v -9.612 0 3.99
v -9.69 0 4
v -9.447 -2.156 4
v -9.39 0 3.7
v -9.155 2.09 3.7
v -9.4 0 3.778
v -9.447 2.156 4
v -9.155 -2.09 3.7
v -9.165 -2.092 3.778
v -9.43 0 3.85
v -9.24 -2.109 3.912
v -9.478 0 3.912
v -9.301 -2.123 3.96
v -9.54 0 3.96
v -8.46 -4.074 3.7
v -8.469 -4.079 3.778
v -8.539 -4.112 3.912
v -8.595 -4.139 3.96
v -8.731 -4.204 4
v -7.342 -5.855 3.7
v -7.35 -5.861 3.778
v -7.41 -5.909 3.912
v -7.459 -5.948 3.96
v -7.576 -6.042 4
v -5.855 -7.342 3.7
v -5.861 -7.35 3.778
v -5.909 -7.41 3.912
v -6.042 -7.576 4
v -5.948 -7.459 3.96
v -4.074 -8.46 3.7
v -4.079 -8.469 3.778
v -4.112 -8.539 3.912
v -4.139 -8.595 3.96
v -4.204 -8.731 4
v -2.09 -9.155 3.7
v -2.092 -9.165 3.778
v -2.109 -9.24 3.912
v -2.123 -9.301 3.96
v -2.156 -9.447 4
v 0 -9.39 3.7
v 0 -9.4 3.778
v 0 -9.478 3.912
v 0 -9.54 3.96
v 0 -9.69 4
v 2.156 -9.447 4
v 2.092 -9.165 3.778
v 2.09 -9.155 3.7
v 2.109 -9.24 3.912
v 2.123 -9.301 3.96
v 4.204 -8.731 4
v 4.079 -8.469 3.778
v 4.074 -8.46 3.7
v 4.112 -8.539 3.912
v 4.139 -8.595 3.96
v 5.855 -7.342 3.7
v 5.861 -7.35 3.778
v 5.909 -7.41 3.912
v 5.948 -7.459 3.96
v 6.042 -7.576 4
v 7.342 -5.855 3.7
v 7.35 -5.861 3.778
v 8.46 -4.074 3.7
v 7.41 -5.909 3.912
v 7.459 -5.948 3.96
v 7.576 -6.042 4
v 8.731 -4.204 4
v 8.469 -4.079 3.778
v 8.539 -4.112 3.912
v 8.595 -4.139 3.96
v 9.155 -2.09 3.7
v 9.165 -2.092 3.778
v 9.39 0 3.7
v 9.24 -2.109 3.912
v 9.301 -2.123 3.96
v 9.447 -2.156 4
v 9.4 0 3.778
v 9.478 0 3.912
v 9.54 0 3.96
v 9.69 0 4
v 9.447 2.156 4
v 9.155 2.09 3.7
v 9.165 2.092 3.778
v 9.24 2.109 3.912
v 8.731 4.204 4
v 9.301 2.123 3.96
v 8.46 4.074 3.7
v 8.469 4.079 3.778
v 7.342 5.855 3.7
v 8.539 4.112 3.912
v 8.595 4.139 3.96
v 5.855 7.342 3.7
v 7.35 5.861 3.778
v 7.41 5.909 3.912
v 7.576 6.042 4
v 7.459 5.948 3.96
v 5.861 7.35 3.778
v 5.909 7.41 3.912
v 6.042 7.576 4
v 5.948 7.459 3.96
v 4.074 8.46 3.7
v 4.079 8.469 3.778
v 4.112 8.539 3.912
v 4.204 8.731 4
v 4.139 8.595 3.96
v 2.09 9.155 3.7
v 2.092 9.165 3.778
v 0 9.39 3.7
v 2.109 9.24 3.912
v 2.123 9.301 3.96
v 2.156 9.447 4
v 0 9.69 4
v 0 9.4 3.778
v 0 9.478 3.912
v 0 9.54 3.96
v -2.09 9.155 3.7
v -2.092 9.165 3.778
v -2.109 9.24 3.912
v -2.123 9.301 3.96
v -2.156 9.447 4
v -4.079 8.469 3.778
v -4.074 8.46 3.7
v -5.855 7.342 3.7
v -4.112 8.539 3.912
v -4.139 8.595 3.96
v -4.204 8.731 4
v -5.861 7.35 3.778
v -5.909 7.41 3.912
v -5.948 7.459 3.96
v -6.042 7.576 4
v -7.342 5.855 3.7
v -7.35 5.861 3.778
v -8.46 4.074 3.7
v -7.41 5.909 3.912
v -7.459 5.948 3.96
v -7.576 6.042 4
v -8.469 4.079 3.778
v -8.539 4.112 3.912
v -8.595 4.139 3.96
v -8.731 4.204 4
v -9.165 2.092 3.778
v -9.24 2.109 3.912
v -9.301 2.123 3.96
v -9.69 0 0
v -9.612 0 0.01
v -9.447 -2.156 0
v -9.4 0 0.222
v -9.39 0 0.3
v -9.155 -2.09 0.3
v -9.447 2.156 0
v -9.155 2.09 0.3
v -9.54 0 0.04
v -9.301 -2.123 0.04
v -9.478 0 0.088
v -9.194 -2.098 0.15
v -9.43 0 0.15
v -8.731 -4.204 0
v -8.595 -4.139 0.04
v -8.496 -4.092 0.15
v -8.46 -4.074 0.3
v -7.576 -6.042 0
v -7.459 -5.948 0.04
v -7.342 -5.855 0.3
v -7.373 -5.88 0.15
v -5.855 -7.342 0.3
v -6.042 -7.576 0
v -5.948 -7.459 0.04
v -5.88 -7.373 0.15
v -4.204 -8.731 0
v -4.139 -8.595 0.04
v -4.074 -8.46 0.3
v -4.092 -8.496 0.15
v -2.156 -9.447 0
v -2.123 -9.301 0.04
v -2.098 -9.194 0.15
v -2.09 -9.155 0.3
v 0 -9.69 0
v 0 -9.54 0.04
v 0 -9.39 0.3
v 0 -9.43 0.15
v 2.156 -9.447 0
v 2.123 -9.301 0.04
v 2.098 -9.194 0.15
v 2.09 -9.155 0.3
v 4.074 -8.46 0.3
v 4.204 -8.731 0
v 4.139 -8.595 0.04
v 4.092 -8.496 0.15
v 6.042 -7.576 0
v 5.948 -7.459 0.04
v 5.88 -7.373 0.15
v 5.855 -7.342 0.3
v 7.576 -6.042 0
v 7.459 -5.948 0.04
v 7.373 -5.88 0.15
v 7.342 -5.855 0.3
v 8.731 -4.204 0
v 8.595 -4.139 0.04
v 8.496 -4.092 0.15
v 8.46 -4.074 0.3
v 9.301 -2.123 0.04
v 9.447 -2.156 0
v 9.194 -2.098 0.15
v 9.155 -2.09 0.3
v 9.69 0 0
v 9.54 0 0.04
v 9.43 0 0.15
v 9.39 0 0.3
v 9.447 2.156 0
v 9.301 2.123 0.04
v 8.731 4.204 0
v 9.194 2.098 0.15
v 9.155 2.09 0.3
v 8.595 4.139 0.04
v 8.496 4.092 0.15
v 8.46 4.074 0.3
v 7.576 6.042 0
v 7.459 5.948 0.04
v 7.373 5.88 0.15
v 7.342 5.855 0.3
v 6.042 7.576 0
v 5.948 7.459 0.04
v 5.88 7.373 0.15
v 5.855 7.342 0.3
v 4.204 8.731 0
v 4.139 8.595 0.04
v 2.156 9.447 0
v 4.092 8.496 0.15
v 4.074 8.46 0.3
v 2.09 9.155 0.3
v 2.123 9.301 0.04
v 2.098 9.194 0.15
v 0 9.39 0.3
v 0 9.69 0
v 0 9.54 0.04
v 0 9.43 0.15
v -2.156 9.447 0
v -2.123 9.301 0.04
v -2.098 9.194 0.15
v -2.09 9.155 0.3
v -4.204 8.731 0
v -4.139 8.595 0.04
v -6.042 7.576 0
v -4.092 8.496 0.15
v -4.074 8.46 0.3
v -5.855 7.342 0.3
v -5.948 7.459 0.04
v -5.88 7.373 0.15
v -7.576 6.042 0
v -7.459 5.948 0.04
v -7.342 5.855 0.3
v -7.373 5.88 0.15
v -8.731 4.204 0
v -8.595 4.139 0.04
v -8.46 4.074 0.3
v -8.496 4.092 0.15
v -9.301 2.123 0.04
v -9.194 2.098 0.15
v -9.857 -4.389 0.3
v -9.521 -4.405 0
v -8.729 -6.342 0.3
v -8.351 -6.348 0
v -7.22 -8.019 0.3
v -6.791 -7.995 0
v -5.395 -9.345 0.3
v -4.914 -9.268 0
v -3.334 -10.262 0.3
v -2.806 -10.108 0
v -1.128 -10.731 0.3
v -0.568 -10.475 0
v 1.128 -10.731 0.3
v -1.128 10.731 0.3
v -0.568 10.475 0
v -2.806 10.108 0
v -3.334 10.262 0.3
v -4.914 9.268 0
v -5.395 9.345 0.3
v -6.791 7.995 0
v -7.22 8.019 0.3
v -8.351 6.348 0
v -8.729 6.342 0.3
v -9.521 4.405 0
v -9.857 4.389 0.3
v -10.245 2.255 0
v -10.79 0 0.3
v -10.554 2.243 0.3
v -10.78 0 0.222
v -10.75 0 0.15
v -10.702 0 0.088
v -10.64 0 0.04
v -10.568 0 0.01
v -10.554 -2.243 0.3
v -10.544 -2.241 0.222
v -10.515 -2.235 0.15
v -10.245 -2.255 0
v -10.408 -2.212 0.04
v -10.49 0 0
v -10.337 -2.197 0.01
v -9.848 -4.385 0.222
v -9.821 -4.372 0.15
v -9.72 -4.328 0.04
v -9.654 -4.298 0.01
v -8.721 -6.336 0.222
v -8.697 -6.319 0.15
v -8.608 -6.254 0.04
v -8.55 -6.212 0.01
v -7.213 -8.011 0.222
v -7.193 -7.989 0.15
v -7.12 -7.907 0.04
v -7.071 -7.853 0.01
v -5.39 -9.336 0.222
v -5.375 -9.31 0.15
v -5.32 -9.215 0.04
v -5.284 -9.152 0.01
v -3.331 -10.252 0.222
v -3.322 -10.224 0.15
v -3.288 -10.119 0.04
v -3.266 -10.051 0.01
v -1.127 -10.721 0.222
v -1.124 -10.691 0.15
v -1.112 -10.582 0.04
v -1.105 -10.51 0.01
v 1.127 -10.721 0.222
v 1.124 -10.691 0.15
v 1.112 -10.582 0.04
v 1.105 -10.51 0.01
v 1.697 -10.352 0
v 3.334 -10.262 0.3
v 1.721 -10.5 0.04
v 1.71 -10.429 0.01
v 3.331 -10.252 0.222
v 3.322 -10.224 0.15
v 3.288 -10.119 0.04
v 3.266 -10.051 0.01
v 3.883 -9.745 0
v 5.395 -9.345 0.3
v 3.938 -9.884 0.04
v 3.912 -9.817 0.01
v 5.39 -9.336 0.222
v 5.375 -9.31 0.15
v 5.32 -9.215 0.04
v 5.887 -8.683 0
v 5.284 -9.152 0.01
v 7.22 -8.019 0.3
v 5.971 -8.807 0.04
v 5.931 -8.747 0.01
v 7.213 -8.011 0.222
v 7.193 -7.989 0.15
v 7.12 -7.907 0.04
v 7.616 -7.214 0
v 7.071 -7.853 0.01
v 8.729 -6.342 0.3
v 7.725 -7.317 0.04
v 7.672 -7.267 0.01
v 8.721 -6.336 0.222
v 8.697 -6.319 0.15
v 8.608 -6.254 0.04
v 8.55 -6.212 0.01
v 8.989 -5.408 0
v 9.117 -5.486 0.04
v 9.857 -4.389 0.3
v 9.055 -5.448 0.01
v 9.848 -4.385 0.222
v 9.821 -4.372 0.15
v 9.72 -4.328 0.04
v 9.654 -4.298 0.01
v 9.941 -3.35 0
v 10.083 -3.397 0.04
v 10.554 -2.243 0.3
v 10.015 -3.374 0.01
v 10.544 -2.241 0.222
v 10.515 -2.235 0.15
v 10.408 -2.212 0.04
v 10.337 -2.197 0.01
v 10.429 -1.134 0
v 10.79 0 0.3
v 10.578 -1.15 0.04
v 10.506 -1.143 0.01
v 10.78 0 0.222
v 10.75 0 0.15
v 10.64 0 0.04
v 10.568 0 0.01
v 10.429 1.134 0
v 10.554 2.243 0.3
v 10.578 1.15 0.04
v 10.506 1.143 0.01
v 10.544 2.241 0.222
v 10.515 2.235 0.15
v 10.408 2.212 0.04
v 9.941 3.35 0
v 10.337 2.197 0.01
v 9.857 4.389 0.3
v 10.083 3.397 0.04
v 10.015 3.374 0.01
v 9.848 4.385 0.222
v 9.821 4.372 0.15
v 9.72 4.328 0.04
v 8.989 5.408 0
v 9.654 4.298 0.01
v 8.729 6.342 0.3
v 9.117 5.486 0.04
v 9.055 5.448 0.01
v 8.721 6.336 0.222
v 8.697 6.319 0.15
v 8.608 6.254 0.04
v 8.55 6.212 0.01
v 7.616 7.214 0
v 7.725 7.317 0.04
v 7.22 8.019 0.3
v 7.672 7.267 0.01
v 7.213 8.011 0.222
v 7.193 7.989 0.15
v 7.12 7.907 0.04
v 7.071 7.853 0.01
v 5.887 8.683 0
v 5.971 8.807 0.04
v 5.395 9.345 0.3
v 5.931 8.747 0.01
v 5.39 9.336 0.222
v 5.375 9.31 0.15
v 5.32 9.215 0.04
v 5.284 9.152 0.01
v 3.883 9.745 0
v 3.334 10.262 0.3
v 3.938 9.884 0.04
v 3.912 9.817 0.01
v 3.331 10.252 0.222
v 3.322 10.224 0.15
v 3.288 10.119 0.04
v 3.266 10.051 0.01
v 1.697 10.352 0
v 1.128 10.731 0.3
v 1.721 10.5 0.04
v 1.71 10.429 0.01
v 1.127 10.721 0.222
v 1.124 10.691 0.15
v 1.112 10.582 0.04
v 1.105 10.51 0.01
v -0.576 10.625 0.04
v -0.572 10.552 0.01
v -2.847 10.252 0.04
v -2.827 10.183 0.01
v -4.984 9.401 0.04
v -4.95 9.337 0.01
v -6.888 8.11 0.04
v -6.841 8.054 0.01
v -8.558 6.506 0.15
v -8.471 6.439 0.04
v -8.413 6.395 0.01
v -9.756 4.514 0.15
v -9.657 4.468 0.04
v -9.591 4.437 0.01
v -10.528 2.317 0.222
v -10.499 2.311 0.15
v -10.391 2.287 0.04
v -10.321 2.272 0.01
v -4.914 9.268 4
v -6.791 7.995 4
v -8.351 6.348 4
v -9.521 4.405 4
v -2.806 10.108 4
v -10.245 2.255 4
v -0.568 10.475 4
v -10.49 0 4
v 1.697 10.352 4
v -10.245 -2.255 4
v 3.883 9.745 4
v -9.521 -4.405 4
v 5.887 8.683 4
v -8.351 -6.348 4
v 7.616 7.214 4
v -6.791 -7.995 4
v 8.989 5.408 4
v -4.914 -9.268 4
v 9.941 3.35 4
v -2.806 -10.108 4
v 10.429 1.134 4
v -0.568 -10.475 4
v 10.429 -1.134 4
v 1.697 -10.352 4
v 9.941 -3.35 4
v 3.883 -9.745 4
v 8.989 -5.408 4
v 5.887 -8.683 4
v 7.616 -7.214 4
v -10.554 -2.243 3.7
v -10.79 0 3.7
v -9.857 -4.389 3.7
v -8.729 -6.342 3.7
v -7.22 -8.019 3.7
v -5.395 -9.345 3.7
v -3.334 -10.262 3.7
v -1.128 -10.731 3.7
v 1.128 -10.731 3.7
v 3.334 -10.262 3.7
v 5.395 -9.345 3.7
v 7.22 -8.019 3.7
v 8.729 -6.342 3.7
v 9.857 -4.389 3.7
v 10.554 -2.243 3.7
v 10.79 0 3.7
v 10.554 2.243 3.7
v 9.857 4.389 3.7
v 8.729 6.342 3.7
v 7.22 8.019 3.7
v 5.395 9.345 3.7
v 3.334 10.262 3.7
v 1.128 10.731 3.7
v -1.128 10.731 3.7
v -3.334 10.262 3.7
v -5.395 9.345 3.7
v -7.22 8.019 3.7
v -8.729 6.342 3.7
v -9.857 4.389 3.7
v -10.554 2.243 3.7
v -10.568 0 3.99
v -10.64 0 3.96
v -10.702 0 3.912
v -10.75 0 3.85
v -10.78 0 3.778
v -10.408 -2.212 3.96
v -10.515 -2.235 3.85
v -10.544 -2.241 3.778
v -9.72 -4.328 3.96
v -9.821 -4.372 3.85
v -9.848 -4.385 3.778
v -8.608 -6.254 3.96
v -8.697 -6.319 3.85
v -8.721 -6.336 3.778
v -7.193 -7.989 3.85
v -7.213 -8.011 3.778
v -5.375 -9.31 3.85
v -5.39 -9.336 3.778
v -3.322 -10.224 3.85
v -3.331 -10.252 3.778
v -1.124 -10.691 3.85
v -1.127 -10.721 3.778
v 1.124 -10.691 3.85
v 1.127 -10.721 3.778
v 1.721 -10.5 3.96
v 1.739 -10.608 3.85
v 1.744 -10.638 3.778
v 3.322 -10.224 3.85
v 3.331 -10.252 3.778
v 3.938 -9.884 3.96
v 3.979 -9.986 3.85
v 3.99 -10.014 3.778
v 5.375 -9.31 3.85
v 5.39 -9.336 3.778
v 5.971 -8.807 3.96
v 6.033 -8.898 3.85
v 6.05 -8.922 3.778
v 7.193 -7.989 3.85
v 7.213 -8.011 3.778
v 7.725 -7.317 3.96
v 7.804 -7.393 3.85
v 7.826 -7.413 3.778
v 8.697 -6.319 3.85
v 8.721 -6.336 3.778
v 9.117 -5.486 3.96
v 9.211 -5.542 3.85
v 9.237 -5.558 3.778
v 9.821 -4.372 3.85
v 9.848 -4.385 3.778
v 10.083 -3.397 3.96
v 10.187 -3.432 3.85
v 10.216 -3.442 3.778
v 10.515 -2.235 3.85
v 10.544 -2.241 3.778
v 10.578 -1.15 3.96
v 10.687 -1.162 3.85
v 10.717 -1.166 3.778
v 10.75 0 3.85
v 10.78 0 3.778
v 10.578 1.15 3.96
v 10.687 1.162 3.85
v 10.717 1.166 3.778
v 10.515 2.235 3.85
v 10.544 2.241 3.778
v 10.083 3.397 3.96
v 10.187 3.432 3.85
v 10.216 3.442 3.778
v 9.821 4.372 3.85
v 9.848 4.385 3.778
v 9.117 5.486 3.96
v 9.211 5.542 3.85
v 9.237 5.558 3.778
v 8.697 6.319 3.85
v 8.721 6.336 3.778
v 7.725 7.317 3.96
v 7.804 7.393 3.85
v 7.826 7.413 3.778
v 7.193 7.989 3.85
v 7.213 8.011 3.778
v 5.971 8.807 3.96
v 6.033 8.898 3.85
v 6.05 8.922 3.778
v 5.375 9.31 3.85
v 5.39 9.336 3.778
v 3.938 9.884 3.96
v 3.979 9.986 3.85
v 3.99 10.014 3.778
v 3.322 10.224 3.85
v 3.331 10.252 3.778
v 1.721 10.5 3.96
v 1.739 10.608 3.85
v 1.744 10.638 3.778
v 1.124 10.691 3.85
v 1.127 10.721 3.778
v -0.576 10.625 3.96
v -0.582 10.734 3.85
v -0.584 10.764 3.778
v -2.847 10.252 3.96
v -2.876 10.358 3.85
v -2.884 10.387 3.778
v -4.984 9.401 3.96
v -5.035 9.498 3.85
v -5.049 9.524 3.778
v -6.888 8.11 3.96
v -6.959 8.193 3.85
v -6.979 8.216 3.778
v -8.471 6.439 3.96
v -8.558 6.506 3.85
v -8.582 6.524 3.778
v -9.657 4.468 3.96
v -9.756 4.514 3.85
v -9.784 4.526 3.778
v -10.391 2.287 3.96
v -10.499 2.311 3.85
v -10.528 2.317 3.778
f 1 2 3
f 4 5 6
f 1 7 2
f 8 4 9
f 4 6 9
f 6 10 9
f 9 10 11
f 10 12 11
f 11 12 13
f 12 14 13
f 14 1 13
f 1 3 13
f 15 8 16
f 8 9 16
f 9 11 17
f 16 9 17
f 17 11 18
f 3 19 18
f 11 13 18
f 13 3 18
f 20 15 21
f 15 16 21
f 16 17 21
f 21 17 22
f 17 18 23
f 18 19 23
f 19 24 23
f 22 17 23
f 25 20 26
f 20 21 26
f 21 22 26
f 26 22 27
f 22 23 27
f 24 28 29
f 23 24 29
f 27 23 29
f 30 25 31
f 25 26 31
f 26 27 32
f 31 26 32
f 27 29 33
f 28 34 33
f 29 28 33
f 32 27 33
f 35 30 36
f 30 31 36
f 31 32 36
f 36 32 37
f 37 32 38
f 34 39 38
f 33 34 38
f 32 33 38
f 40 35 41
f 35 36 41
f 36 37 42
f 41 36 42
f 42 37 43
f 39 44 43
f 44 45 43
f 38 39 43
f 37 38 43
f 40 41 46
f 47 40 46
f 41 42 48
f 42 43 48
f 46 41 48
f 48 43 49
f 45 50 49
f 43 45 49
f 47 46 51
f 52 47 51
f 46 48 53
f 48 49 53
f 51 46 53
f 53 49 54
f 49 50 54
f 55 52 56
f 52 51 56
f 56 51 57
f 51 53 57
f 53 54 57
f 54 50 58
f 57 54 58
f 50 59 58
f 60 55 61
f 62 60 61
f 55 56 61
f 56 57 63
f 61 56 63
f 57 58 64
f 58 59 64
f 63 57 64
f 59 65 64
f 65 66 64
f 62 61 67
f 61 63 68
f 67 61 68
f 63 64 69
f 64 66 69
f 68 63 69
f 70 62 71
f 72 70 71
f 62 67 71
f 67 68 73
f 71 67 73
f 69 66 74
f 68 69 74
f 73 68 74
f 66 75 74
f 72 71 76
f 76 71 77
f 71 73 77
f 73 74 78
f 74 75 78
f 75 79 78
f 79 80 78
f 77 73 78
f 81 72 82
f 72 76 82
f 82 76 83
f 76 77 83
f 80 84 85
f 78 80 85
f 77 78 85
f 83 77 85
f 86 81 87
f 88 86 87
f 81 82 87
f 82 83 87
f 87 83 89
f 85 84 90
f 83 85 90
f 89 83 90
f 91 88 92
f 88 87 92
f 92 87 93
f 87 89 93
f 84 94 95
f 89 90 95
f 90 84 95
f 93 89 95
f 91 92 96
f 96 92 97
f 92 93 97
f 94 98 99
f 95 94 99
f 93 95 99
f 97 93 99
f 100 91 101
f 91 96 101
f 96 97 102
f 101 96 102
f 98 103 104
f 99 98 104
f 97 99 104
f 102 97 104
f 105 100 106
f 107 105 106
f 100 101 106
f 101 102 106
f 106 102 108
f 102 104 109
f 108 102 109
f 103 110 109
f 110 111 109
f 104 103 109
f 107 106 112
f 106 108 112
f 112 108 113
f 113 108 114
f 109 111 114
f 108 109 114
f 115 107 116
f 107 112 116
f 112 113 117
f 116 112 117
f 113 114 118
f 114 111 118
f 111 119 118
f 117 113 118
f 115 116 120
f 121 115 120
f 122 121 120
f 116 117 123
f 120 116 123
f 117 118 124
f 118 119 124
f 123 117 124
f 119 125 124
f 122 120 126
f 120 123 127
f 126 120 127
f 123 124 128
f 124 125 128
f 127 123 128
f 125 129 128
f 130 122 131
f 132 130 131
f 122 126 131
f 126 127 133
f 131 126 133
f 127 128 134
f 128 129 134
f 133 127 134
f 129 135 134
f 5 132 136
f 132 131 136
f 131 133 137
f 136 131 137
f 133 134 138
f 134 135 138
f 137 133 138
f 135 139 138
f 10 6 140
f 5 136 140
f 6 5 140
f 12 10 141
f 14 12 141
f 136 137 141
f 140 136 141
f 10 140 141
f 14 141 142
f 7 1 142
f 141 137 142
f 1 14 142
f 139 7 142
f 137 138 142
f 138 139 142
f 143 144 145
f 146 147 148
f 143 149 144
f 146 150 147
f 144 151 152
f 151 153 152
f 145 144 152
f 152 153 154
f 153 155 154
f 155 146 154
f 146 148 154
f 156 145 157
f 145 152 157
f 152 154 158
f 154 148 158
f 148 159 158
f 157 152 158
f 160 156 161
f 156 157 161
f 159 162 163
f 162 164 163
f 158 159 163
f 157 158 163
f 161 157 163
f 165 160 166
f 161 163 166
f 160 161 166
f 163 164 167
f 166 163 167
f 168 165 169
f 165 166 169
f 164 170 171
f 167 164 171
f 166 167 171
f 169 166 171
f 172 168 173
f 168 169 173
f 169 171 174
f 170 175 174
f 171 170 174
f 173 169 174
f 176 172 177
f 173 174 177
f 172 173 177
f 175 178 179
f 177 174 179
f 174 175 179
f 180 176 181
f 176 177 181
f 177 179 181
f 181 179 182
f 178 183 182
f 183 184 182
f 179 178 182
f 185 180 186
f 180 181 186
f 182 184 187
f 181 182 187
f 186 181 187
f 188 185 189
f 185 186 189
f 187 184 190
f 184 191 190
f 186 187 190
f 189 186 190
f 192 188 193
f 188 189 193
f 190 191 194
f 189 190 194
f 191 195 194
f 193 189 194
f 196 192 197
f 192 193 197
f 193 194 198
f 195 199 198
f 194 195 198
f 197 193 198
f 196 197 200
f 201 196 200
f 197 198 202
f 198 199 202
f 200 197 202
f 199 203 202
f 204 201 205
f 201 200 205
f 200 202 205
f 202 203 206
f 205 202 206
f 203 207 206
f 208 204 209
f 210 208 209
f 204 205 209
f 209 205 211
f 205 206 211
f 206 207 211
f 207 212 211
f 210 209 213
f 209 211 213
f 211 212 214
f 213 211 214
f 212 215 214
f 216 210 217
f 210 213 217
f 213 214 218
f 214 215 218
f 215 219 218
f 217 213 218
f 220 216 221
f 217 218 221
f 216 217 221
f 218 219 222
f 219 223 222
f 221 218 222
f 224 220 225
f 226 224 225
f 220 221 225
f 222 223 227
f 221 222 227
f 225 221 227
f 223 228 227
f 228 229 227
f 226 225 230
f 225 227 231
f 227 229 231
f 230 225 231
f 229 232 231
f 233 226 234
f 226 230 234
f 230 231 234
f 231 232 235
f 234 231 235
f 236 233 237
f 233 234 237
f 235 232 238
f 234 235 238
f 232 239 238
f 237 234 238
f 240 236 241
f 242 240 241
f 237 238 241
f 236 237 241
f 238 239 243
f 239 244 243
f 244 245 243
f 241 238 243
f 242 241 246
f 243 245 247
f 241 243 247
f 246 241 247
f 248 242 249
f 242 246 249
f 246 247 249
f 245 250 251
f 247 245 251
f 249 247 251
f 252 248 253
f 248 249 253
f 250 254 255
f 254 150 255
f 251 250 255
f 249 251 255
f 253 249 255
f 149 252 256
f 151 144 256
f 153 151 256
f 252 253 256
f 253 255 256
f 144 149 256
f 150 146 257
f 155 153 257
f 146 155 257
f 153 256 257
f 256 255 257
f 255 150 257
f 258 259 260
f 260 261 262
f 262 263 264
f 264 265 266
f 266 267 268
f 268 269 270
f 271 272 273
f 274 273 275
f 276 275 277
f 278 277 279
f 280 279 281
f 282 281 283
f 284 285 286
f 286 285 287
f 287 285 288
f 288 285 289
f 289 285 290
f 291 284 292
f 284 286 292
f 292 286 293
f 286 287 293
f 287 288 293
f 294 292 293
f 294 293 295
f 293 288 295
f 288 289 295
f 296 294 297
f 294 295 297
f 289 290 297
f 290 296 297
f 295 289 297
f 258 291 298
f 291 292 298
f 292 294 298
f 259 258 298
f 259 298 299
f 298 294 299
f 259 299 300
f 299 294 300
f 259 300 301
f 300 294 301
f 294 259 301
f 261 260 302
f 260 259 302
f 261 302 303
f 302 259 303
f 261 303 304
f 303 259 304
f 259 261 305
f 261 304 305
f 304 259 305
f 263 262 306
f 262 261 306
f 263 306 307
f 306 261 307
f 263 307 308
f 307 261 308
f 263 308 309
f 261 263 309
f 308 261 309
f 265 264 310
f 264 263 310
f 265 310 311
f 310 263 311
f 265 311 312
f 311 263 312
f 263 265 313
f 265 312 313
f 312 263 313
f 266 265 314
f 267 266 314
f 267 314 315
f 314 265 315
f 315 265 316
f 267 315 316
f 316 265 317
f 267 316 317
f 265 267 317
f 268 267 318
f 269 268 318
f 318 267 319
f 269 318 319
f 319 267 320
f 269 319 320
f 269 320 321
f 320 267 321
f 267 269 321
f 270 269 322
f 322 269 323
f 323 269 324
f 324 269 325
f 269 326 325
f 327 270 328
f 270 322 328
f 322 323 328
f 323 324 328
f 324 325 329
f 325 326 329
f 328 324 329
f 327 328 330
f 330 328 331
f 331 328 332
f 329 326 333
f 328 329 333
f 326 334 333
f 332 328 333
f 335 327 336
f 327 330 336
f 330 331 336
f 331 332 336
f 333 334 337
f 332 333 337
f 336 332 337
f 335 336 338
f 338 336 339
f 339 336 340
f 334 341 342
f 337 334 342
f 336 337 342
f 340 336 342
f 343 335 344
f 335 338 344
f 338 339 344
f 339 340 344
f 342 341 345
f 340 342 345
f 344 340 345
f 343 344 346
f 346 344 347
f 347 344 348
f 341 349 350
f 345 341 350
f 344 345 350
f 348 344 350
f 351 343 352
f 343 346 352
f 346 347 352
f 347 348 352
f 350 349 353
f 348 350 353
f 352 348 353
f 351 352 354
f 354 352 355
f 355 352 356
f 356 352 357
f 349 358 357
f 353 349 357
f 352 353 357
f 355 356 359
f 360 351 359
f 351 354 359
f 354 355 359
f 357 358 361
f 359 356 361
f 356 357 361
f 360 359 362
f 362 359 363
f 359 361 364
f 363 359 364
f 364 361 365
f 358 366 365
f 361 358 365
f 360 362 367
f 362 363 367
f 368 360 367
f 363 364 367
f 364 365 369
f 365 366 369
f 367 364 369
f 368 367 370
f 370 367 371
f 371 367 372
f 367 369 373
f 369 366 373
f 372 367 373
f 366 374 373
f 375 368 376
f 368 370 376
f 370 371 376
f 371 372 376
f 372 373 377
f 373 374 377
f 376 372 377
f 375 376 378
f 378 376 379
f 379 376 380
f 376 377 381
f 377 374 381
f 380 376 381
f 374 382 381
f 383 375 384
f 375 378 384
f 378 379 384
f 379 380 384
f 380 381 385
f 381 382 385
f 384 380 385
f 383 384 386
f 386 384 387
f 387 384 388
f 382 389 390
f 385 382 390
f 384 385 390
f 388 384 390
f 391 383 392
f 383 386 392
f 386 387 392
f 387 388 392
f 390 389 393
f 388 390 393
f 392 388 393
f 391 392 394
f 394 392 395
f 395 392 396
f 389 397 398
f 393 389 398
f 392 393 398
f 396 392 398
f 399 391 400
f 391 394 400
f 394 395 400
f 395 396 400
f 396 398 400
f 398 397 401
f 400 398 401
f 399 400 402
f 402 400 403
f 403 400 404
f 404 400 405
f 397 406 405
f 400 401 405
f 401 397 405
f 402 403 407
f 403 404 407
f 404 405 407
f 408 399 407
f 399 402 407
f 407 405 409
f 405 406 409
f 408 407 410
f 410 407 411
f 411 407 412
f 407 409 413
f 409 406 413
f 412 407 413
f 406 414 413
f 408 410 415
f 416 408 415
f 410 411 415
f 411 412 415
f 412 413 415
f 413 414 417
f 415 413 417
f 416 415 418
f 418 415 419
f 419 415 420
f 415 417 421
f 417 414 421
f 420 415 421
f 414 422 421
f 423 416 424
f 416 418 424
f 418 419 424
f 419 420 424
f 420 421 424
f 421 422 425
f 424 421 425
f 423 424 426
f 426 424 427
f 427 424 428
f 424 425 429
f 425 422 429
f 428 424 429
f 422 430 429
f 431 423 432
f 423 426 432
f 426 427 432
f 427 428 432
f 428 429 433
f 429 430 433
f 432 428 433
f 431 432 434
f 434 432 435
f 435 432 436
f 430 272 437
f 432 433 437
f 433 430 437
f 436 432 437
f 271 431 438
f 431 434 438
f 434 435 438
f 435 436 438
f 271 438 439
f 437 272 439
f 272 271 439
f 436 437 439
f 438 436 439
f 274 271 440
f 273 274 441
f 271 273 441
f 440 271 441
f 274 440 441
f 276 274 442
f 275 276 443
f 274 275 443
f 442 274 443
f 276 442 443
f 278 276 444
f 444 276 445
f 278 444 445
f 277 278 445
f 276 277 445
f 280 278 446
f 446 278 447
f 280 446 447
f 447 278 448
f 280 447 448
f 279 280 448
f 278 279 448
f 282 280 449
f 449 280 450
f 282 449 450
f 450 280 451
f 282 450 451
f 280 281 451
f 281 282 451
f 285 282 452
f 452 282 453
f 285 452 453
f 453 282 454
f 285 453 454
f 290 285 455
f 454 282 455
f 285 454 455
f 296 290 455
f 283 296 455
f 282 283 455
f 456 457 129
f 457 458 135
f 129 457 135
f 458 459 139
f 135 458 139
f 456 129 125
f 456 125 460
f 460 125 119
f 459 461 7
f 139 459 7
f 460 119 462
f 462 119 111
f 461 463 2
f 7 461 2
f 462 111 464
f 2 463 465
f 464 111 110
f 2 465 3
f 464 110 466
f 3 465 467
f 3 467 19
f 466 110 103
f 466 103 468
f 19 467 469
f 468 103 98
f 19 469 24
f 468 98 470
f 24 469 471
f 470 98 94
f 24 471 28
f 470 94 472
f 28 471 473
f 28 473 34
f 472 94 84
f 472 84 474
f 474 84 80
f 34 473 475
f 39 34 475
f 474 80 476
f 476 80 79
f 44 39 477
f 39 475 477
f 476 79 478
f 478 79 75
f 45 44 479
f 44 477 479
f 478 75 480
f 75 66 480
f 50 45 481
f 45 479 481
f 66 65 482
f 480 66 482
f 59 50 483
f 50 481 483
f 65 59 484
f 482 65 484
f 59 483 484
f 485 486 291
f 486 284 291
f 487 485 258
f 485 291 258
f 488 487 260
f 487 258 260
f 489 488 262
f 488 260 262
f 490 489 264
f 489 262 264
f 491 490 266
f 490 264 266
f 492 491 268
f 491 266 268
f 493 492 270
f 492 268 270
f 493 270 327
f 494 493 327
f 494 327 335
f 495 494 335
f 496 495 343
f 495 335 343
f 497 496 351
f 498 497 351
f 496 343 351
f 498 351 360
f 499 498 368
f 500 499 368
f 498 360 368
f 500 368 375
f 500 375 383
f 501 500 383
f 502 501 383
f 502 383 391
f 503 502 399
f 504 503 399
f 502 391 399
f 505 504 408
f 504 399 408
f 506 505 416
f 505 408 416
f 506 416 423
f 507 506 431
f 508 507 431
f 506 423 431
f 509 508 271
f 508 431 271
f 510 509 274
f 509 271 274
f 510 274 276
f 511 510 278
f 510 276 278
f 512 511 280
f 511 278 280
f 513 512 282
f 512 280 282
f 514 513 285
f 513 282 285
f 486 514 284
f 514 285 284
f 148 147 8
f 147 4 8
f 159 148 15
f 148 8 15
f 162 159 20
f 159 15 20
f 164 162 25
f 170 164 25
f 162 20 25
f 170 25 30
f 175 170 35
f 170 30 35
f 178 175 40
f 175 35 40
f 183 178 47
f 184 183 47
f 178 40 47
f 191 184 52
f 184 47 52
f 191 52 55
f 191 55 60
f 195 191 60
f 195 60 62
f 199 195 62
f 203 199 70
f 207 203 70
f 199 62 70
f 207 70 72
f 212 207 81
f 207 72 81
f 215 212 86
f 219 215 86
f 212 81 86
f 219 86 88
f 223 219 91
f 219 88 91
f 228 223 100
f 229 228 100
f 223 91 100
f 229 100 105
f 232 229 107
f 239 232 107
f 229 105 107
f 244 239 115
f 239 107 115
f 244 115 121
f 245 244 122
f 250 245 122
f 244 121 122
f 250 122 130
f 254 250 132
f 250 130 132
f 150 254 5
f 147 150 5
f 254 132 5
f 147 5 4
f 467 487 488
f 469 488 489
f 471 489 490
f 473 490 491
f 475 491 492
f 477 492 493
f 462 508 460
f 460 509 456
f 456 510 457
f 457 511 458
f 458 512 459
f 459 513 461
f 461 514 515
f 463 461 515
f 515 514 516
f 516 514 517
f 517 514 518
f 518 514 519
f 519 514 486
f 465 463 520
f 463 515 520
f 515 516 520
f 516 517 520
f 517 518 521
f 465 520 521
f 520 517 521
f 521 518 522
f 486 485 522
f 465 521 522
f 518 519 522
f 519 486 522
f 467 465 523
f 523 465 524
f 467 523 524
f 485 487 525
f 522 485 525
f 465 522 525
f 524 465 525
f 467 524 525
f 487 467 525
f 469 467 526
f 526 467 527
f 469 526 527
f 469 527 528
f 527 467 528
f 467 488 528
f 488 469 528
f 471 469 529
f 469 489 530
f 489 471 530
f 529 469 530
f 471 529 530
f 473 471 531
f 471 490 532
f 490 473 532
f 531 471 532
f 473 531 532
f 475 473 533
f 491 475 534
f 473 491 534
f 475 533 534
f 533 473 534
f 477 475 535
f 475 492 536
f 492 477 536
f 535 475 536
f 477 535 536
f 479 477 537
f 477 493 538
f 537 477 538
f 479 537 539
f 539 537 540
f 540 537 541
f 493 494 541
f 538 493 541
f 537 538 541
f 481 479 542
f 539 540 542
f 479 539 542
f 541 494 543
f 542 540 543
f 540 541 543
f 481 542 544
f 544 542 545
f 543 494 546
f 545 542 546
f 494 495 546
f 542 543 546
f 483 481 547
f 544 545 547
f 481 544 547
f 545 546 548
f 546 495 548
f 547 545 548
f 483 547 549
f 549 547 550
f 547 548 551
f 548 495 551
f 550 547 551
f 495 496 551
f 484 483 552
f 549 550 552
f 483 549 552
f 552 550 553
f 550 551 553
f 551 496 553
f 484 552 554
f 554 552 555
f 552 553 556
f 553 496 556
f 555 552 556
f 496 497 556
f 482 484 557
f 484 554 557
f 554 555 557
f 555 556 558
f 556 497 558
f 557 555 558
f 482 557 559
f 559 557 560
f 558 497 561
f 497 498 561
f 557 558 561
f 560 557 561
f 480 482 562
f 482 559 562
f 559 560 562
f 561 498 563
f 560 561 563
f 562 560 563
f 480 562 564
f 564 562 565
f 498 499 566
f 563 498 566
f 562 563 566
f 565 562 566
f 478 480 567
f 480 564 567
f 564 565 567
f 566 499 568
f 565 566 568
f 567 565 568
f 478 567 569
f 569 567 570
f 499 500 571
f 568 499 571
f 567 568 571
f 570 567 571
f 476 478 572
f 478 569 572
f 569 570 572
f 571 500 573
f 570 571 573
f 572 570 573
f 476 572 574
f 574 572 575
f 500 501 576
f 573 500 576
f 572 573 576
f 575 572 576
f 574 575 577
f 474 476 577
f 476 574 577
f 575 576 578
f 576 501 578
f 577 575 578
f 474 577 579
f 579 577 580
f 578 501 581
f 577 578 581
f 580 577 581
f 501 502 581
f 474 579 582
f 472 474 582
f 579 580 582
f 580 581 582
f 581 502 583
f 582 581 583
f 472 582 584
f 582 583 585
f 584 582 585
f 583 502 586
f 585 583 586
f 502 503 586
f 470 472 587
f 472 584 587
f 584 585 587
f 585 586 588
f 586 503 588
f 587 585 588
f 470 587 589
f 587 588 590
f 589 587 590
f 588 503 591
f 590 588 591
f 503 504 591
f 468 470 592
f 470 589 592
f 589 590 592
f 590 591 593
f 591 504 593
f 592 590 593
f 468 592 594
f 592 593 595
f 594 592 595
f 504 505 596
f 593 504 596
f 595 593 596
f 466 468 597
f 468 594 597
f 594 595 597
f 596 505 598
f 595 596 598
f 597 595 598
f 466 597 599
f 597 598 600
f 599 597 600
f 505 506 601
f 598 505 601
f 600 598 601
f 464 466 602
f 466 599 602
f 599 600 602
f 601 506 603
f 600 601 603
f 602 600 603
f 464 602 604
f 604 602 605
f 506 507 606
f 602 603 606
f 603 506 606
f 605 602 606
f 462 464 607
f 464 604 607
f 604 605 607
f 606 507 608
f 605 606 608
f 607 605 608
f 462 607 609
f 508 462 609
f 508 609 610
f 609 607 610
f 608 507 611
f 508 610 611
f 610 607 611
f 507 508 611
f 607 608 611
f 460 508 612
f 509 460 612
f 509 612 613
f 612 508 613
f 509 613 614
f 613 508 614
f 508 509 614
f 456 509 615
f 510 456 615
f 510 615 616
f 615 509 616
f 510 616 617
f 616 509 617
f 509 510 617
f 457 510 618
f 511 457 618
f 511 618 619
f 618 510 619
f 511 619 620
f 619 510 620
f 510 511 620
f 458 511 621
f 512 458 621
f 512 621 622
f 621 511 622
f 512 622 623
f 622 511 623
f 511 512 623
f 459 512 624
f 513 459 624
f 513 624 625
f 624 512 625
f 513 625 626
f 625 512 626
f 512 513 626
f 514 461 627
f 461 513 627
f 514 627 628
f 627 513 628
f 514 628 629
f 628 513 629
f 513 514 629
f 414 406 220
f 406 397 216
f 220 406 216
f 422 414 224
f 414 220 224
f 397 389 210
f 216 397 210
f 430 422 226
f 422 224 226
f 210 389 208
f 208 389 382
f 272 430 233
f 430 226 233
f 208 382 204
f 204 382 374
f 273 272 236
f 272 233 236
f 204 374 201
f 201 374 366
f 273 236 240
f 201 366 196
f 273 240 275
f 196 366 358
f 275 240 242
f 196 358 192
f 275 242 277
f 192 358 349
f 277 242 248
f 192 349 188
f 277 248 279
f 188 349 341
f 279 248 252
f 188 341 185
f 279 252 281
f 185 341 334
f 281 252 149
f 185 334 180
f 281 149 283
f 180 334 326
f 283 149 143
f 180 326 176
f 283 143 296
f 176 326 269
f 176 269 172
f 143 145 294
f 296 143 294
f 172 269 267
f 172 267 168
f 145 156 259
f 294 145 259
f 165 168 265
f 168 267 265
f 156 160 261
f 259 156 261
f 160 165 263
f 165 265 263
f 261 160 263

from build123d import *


with BuildPart() as part:
    # Sketch → Revolution (revolve)
    with BuildSketch(Plane.XZ):
        with BuildLine():
            ThreePointArc((-10.790142, 0.3), (-10.702274, 0.087868), (-10.490142, 0))
            Line((-10.490142, 0), (-9.690142, 0))
            ThreePointArc((-9.690142, 0), (-9.47801, 0.087868), (-9.390142, 0.3))
            Line((-9.390142, 0.3), (-9.390142, 3.7))
            ThreePointArc((-9.390142, 3.7), (-9.47801, 3.912132), (-9.690142, 4))
            Line((-9.690142, 4), (-10.490142, 4))
            ThreePointArc((-10.490142, 4), (-10.702274, 3.912132), (-10.790142, 3.7))
            Line((-10.790142, 3.7), (-10.790142, 0.3))
        make_face()
    revolve(axis=Axis((0, 0, 0), (0, 0, 1)))


solid = part.part
